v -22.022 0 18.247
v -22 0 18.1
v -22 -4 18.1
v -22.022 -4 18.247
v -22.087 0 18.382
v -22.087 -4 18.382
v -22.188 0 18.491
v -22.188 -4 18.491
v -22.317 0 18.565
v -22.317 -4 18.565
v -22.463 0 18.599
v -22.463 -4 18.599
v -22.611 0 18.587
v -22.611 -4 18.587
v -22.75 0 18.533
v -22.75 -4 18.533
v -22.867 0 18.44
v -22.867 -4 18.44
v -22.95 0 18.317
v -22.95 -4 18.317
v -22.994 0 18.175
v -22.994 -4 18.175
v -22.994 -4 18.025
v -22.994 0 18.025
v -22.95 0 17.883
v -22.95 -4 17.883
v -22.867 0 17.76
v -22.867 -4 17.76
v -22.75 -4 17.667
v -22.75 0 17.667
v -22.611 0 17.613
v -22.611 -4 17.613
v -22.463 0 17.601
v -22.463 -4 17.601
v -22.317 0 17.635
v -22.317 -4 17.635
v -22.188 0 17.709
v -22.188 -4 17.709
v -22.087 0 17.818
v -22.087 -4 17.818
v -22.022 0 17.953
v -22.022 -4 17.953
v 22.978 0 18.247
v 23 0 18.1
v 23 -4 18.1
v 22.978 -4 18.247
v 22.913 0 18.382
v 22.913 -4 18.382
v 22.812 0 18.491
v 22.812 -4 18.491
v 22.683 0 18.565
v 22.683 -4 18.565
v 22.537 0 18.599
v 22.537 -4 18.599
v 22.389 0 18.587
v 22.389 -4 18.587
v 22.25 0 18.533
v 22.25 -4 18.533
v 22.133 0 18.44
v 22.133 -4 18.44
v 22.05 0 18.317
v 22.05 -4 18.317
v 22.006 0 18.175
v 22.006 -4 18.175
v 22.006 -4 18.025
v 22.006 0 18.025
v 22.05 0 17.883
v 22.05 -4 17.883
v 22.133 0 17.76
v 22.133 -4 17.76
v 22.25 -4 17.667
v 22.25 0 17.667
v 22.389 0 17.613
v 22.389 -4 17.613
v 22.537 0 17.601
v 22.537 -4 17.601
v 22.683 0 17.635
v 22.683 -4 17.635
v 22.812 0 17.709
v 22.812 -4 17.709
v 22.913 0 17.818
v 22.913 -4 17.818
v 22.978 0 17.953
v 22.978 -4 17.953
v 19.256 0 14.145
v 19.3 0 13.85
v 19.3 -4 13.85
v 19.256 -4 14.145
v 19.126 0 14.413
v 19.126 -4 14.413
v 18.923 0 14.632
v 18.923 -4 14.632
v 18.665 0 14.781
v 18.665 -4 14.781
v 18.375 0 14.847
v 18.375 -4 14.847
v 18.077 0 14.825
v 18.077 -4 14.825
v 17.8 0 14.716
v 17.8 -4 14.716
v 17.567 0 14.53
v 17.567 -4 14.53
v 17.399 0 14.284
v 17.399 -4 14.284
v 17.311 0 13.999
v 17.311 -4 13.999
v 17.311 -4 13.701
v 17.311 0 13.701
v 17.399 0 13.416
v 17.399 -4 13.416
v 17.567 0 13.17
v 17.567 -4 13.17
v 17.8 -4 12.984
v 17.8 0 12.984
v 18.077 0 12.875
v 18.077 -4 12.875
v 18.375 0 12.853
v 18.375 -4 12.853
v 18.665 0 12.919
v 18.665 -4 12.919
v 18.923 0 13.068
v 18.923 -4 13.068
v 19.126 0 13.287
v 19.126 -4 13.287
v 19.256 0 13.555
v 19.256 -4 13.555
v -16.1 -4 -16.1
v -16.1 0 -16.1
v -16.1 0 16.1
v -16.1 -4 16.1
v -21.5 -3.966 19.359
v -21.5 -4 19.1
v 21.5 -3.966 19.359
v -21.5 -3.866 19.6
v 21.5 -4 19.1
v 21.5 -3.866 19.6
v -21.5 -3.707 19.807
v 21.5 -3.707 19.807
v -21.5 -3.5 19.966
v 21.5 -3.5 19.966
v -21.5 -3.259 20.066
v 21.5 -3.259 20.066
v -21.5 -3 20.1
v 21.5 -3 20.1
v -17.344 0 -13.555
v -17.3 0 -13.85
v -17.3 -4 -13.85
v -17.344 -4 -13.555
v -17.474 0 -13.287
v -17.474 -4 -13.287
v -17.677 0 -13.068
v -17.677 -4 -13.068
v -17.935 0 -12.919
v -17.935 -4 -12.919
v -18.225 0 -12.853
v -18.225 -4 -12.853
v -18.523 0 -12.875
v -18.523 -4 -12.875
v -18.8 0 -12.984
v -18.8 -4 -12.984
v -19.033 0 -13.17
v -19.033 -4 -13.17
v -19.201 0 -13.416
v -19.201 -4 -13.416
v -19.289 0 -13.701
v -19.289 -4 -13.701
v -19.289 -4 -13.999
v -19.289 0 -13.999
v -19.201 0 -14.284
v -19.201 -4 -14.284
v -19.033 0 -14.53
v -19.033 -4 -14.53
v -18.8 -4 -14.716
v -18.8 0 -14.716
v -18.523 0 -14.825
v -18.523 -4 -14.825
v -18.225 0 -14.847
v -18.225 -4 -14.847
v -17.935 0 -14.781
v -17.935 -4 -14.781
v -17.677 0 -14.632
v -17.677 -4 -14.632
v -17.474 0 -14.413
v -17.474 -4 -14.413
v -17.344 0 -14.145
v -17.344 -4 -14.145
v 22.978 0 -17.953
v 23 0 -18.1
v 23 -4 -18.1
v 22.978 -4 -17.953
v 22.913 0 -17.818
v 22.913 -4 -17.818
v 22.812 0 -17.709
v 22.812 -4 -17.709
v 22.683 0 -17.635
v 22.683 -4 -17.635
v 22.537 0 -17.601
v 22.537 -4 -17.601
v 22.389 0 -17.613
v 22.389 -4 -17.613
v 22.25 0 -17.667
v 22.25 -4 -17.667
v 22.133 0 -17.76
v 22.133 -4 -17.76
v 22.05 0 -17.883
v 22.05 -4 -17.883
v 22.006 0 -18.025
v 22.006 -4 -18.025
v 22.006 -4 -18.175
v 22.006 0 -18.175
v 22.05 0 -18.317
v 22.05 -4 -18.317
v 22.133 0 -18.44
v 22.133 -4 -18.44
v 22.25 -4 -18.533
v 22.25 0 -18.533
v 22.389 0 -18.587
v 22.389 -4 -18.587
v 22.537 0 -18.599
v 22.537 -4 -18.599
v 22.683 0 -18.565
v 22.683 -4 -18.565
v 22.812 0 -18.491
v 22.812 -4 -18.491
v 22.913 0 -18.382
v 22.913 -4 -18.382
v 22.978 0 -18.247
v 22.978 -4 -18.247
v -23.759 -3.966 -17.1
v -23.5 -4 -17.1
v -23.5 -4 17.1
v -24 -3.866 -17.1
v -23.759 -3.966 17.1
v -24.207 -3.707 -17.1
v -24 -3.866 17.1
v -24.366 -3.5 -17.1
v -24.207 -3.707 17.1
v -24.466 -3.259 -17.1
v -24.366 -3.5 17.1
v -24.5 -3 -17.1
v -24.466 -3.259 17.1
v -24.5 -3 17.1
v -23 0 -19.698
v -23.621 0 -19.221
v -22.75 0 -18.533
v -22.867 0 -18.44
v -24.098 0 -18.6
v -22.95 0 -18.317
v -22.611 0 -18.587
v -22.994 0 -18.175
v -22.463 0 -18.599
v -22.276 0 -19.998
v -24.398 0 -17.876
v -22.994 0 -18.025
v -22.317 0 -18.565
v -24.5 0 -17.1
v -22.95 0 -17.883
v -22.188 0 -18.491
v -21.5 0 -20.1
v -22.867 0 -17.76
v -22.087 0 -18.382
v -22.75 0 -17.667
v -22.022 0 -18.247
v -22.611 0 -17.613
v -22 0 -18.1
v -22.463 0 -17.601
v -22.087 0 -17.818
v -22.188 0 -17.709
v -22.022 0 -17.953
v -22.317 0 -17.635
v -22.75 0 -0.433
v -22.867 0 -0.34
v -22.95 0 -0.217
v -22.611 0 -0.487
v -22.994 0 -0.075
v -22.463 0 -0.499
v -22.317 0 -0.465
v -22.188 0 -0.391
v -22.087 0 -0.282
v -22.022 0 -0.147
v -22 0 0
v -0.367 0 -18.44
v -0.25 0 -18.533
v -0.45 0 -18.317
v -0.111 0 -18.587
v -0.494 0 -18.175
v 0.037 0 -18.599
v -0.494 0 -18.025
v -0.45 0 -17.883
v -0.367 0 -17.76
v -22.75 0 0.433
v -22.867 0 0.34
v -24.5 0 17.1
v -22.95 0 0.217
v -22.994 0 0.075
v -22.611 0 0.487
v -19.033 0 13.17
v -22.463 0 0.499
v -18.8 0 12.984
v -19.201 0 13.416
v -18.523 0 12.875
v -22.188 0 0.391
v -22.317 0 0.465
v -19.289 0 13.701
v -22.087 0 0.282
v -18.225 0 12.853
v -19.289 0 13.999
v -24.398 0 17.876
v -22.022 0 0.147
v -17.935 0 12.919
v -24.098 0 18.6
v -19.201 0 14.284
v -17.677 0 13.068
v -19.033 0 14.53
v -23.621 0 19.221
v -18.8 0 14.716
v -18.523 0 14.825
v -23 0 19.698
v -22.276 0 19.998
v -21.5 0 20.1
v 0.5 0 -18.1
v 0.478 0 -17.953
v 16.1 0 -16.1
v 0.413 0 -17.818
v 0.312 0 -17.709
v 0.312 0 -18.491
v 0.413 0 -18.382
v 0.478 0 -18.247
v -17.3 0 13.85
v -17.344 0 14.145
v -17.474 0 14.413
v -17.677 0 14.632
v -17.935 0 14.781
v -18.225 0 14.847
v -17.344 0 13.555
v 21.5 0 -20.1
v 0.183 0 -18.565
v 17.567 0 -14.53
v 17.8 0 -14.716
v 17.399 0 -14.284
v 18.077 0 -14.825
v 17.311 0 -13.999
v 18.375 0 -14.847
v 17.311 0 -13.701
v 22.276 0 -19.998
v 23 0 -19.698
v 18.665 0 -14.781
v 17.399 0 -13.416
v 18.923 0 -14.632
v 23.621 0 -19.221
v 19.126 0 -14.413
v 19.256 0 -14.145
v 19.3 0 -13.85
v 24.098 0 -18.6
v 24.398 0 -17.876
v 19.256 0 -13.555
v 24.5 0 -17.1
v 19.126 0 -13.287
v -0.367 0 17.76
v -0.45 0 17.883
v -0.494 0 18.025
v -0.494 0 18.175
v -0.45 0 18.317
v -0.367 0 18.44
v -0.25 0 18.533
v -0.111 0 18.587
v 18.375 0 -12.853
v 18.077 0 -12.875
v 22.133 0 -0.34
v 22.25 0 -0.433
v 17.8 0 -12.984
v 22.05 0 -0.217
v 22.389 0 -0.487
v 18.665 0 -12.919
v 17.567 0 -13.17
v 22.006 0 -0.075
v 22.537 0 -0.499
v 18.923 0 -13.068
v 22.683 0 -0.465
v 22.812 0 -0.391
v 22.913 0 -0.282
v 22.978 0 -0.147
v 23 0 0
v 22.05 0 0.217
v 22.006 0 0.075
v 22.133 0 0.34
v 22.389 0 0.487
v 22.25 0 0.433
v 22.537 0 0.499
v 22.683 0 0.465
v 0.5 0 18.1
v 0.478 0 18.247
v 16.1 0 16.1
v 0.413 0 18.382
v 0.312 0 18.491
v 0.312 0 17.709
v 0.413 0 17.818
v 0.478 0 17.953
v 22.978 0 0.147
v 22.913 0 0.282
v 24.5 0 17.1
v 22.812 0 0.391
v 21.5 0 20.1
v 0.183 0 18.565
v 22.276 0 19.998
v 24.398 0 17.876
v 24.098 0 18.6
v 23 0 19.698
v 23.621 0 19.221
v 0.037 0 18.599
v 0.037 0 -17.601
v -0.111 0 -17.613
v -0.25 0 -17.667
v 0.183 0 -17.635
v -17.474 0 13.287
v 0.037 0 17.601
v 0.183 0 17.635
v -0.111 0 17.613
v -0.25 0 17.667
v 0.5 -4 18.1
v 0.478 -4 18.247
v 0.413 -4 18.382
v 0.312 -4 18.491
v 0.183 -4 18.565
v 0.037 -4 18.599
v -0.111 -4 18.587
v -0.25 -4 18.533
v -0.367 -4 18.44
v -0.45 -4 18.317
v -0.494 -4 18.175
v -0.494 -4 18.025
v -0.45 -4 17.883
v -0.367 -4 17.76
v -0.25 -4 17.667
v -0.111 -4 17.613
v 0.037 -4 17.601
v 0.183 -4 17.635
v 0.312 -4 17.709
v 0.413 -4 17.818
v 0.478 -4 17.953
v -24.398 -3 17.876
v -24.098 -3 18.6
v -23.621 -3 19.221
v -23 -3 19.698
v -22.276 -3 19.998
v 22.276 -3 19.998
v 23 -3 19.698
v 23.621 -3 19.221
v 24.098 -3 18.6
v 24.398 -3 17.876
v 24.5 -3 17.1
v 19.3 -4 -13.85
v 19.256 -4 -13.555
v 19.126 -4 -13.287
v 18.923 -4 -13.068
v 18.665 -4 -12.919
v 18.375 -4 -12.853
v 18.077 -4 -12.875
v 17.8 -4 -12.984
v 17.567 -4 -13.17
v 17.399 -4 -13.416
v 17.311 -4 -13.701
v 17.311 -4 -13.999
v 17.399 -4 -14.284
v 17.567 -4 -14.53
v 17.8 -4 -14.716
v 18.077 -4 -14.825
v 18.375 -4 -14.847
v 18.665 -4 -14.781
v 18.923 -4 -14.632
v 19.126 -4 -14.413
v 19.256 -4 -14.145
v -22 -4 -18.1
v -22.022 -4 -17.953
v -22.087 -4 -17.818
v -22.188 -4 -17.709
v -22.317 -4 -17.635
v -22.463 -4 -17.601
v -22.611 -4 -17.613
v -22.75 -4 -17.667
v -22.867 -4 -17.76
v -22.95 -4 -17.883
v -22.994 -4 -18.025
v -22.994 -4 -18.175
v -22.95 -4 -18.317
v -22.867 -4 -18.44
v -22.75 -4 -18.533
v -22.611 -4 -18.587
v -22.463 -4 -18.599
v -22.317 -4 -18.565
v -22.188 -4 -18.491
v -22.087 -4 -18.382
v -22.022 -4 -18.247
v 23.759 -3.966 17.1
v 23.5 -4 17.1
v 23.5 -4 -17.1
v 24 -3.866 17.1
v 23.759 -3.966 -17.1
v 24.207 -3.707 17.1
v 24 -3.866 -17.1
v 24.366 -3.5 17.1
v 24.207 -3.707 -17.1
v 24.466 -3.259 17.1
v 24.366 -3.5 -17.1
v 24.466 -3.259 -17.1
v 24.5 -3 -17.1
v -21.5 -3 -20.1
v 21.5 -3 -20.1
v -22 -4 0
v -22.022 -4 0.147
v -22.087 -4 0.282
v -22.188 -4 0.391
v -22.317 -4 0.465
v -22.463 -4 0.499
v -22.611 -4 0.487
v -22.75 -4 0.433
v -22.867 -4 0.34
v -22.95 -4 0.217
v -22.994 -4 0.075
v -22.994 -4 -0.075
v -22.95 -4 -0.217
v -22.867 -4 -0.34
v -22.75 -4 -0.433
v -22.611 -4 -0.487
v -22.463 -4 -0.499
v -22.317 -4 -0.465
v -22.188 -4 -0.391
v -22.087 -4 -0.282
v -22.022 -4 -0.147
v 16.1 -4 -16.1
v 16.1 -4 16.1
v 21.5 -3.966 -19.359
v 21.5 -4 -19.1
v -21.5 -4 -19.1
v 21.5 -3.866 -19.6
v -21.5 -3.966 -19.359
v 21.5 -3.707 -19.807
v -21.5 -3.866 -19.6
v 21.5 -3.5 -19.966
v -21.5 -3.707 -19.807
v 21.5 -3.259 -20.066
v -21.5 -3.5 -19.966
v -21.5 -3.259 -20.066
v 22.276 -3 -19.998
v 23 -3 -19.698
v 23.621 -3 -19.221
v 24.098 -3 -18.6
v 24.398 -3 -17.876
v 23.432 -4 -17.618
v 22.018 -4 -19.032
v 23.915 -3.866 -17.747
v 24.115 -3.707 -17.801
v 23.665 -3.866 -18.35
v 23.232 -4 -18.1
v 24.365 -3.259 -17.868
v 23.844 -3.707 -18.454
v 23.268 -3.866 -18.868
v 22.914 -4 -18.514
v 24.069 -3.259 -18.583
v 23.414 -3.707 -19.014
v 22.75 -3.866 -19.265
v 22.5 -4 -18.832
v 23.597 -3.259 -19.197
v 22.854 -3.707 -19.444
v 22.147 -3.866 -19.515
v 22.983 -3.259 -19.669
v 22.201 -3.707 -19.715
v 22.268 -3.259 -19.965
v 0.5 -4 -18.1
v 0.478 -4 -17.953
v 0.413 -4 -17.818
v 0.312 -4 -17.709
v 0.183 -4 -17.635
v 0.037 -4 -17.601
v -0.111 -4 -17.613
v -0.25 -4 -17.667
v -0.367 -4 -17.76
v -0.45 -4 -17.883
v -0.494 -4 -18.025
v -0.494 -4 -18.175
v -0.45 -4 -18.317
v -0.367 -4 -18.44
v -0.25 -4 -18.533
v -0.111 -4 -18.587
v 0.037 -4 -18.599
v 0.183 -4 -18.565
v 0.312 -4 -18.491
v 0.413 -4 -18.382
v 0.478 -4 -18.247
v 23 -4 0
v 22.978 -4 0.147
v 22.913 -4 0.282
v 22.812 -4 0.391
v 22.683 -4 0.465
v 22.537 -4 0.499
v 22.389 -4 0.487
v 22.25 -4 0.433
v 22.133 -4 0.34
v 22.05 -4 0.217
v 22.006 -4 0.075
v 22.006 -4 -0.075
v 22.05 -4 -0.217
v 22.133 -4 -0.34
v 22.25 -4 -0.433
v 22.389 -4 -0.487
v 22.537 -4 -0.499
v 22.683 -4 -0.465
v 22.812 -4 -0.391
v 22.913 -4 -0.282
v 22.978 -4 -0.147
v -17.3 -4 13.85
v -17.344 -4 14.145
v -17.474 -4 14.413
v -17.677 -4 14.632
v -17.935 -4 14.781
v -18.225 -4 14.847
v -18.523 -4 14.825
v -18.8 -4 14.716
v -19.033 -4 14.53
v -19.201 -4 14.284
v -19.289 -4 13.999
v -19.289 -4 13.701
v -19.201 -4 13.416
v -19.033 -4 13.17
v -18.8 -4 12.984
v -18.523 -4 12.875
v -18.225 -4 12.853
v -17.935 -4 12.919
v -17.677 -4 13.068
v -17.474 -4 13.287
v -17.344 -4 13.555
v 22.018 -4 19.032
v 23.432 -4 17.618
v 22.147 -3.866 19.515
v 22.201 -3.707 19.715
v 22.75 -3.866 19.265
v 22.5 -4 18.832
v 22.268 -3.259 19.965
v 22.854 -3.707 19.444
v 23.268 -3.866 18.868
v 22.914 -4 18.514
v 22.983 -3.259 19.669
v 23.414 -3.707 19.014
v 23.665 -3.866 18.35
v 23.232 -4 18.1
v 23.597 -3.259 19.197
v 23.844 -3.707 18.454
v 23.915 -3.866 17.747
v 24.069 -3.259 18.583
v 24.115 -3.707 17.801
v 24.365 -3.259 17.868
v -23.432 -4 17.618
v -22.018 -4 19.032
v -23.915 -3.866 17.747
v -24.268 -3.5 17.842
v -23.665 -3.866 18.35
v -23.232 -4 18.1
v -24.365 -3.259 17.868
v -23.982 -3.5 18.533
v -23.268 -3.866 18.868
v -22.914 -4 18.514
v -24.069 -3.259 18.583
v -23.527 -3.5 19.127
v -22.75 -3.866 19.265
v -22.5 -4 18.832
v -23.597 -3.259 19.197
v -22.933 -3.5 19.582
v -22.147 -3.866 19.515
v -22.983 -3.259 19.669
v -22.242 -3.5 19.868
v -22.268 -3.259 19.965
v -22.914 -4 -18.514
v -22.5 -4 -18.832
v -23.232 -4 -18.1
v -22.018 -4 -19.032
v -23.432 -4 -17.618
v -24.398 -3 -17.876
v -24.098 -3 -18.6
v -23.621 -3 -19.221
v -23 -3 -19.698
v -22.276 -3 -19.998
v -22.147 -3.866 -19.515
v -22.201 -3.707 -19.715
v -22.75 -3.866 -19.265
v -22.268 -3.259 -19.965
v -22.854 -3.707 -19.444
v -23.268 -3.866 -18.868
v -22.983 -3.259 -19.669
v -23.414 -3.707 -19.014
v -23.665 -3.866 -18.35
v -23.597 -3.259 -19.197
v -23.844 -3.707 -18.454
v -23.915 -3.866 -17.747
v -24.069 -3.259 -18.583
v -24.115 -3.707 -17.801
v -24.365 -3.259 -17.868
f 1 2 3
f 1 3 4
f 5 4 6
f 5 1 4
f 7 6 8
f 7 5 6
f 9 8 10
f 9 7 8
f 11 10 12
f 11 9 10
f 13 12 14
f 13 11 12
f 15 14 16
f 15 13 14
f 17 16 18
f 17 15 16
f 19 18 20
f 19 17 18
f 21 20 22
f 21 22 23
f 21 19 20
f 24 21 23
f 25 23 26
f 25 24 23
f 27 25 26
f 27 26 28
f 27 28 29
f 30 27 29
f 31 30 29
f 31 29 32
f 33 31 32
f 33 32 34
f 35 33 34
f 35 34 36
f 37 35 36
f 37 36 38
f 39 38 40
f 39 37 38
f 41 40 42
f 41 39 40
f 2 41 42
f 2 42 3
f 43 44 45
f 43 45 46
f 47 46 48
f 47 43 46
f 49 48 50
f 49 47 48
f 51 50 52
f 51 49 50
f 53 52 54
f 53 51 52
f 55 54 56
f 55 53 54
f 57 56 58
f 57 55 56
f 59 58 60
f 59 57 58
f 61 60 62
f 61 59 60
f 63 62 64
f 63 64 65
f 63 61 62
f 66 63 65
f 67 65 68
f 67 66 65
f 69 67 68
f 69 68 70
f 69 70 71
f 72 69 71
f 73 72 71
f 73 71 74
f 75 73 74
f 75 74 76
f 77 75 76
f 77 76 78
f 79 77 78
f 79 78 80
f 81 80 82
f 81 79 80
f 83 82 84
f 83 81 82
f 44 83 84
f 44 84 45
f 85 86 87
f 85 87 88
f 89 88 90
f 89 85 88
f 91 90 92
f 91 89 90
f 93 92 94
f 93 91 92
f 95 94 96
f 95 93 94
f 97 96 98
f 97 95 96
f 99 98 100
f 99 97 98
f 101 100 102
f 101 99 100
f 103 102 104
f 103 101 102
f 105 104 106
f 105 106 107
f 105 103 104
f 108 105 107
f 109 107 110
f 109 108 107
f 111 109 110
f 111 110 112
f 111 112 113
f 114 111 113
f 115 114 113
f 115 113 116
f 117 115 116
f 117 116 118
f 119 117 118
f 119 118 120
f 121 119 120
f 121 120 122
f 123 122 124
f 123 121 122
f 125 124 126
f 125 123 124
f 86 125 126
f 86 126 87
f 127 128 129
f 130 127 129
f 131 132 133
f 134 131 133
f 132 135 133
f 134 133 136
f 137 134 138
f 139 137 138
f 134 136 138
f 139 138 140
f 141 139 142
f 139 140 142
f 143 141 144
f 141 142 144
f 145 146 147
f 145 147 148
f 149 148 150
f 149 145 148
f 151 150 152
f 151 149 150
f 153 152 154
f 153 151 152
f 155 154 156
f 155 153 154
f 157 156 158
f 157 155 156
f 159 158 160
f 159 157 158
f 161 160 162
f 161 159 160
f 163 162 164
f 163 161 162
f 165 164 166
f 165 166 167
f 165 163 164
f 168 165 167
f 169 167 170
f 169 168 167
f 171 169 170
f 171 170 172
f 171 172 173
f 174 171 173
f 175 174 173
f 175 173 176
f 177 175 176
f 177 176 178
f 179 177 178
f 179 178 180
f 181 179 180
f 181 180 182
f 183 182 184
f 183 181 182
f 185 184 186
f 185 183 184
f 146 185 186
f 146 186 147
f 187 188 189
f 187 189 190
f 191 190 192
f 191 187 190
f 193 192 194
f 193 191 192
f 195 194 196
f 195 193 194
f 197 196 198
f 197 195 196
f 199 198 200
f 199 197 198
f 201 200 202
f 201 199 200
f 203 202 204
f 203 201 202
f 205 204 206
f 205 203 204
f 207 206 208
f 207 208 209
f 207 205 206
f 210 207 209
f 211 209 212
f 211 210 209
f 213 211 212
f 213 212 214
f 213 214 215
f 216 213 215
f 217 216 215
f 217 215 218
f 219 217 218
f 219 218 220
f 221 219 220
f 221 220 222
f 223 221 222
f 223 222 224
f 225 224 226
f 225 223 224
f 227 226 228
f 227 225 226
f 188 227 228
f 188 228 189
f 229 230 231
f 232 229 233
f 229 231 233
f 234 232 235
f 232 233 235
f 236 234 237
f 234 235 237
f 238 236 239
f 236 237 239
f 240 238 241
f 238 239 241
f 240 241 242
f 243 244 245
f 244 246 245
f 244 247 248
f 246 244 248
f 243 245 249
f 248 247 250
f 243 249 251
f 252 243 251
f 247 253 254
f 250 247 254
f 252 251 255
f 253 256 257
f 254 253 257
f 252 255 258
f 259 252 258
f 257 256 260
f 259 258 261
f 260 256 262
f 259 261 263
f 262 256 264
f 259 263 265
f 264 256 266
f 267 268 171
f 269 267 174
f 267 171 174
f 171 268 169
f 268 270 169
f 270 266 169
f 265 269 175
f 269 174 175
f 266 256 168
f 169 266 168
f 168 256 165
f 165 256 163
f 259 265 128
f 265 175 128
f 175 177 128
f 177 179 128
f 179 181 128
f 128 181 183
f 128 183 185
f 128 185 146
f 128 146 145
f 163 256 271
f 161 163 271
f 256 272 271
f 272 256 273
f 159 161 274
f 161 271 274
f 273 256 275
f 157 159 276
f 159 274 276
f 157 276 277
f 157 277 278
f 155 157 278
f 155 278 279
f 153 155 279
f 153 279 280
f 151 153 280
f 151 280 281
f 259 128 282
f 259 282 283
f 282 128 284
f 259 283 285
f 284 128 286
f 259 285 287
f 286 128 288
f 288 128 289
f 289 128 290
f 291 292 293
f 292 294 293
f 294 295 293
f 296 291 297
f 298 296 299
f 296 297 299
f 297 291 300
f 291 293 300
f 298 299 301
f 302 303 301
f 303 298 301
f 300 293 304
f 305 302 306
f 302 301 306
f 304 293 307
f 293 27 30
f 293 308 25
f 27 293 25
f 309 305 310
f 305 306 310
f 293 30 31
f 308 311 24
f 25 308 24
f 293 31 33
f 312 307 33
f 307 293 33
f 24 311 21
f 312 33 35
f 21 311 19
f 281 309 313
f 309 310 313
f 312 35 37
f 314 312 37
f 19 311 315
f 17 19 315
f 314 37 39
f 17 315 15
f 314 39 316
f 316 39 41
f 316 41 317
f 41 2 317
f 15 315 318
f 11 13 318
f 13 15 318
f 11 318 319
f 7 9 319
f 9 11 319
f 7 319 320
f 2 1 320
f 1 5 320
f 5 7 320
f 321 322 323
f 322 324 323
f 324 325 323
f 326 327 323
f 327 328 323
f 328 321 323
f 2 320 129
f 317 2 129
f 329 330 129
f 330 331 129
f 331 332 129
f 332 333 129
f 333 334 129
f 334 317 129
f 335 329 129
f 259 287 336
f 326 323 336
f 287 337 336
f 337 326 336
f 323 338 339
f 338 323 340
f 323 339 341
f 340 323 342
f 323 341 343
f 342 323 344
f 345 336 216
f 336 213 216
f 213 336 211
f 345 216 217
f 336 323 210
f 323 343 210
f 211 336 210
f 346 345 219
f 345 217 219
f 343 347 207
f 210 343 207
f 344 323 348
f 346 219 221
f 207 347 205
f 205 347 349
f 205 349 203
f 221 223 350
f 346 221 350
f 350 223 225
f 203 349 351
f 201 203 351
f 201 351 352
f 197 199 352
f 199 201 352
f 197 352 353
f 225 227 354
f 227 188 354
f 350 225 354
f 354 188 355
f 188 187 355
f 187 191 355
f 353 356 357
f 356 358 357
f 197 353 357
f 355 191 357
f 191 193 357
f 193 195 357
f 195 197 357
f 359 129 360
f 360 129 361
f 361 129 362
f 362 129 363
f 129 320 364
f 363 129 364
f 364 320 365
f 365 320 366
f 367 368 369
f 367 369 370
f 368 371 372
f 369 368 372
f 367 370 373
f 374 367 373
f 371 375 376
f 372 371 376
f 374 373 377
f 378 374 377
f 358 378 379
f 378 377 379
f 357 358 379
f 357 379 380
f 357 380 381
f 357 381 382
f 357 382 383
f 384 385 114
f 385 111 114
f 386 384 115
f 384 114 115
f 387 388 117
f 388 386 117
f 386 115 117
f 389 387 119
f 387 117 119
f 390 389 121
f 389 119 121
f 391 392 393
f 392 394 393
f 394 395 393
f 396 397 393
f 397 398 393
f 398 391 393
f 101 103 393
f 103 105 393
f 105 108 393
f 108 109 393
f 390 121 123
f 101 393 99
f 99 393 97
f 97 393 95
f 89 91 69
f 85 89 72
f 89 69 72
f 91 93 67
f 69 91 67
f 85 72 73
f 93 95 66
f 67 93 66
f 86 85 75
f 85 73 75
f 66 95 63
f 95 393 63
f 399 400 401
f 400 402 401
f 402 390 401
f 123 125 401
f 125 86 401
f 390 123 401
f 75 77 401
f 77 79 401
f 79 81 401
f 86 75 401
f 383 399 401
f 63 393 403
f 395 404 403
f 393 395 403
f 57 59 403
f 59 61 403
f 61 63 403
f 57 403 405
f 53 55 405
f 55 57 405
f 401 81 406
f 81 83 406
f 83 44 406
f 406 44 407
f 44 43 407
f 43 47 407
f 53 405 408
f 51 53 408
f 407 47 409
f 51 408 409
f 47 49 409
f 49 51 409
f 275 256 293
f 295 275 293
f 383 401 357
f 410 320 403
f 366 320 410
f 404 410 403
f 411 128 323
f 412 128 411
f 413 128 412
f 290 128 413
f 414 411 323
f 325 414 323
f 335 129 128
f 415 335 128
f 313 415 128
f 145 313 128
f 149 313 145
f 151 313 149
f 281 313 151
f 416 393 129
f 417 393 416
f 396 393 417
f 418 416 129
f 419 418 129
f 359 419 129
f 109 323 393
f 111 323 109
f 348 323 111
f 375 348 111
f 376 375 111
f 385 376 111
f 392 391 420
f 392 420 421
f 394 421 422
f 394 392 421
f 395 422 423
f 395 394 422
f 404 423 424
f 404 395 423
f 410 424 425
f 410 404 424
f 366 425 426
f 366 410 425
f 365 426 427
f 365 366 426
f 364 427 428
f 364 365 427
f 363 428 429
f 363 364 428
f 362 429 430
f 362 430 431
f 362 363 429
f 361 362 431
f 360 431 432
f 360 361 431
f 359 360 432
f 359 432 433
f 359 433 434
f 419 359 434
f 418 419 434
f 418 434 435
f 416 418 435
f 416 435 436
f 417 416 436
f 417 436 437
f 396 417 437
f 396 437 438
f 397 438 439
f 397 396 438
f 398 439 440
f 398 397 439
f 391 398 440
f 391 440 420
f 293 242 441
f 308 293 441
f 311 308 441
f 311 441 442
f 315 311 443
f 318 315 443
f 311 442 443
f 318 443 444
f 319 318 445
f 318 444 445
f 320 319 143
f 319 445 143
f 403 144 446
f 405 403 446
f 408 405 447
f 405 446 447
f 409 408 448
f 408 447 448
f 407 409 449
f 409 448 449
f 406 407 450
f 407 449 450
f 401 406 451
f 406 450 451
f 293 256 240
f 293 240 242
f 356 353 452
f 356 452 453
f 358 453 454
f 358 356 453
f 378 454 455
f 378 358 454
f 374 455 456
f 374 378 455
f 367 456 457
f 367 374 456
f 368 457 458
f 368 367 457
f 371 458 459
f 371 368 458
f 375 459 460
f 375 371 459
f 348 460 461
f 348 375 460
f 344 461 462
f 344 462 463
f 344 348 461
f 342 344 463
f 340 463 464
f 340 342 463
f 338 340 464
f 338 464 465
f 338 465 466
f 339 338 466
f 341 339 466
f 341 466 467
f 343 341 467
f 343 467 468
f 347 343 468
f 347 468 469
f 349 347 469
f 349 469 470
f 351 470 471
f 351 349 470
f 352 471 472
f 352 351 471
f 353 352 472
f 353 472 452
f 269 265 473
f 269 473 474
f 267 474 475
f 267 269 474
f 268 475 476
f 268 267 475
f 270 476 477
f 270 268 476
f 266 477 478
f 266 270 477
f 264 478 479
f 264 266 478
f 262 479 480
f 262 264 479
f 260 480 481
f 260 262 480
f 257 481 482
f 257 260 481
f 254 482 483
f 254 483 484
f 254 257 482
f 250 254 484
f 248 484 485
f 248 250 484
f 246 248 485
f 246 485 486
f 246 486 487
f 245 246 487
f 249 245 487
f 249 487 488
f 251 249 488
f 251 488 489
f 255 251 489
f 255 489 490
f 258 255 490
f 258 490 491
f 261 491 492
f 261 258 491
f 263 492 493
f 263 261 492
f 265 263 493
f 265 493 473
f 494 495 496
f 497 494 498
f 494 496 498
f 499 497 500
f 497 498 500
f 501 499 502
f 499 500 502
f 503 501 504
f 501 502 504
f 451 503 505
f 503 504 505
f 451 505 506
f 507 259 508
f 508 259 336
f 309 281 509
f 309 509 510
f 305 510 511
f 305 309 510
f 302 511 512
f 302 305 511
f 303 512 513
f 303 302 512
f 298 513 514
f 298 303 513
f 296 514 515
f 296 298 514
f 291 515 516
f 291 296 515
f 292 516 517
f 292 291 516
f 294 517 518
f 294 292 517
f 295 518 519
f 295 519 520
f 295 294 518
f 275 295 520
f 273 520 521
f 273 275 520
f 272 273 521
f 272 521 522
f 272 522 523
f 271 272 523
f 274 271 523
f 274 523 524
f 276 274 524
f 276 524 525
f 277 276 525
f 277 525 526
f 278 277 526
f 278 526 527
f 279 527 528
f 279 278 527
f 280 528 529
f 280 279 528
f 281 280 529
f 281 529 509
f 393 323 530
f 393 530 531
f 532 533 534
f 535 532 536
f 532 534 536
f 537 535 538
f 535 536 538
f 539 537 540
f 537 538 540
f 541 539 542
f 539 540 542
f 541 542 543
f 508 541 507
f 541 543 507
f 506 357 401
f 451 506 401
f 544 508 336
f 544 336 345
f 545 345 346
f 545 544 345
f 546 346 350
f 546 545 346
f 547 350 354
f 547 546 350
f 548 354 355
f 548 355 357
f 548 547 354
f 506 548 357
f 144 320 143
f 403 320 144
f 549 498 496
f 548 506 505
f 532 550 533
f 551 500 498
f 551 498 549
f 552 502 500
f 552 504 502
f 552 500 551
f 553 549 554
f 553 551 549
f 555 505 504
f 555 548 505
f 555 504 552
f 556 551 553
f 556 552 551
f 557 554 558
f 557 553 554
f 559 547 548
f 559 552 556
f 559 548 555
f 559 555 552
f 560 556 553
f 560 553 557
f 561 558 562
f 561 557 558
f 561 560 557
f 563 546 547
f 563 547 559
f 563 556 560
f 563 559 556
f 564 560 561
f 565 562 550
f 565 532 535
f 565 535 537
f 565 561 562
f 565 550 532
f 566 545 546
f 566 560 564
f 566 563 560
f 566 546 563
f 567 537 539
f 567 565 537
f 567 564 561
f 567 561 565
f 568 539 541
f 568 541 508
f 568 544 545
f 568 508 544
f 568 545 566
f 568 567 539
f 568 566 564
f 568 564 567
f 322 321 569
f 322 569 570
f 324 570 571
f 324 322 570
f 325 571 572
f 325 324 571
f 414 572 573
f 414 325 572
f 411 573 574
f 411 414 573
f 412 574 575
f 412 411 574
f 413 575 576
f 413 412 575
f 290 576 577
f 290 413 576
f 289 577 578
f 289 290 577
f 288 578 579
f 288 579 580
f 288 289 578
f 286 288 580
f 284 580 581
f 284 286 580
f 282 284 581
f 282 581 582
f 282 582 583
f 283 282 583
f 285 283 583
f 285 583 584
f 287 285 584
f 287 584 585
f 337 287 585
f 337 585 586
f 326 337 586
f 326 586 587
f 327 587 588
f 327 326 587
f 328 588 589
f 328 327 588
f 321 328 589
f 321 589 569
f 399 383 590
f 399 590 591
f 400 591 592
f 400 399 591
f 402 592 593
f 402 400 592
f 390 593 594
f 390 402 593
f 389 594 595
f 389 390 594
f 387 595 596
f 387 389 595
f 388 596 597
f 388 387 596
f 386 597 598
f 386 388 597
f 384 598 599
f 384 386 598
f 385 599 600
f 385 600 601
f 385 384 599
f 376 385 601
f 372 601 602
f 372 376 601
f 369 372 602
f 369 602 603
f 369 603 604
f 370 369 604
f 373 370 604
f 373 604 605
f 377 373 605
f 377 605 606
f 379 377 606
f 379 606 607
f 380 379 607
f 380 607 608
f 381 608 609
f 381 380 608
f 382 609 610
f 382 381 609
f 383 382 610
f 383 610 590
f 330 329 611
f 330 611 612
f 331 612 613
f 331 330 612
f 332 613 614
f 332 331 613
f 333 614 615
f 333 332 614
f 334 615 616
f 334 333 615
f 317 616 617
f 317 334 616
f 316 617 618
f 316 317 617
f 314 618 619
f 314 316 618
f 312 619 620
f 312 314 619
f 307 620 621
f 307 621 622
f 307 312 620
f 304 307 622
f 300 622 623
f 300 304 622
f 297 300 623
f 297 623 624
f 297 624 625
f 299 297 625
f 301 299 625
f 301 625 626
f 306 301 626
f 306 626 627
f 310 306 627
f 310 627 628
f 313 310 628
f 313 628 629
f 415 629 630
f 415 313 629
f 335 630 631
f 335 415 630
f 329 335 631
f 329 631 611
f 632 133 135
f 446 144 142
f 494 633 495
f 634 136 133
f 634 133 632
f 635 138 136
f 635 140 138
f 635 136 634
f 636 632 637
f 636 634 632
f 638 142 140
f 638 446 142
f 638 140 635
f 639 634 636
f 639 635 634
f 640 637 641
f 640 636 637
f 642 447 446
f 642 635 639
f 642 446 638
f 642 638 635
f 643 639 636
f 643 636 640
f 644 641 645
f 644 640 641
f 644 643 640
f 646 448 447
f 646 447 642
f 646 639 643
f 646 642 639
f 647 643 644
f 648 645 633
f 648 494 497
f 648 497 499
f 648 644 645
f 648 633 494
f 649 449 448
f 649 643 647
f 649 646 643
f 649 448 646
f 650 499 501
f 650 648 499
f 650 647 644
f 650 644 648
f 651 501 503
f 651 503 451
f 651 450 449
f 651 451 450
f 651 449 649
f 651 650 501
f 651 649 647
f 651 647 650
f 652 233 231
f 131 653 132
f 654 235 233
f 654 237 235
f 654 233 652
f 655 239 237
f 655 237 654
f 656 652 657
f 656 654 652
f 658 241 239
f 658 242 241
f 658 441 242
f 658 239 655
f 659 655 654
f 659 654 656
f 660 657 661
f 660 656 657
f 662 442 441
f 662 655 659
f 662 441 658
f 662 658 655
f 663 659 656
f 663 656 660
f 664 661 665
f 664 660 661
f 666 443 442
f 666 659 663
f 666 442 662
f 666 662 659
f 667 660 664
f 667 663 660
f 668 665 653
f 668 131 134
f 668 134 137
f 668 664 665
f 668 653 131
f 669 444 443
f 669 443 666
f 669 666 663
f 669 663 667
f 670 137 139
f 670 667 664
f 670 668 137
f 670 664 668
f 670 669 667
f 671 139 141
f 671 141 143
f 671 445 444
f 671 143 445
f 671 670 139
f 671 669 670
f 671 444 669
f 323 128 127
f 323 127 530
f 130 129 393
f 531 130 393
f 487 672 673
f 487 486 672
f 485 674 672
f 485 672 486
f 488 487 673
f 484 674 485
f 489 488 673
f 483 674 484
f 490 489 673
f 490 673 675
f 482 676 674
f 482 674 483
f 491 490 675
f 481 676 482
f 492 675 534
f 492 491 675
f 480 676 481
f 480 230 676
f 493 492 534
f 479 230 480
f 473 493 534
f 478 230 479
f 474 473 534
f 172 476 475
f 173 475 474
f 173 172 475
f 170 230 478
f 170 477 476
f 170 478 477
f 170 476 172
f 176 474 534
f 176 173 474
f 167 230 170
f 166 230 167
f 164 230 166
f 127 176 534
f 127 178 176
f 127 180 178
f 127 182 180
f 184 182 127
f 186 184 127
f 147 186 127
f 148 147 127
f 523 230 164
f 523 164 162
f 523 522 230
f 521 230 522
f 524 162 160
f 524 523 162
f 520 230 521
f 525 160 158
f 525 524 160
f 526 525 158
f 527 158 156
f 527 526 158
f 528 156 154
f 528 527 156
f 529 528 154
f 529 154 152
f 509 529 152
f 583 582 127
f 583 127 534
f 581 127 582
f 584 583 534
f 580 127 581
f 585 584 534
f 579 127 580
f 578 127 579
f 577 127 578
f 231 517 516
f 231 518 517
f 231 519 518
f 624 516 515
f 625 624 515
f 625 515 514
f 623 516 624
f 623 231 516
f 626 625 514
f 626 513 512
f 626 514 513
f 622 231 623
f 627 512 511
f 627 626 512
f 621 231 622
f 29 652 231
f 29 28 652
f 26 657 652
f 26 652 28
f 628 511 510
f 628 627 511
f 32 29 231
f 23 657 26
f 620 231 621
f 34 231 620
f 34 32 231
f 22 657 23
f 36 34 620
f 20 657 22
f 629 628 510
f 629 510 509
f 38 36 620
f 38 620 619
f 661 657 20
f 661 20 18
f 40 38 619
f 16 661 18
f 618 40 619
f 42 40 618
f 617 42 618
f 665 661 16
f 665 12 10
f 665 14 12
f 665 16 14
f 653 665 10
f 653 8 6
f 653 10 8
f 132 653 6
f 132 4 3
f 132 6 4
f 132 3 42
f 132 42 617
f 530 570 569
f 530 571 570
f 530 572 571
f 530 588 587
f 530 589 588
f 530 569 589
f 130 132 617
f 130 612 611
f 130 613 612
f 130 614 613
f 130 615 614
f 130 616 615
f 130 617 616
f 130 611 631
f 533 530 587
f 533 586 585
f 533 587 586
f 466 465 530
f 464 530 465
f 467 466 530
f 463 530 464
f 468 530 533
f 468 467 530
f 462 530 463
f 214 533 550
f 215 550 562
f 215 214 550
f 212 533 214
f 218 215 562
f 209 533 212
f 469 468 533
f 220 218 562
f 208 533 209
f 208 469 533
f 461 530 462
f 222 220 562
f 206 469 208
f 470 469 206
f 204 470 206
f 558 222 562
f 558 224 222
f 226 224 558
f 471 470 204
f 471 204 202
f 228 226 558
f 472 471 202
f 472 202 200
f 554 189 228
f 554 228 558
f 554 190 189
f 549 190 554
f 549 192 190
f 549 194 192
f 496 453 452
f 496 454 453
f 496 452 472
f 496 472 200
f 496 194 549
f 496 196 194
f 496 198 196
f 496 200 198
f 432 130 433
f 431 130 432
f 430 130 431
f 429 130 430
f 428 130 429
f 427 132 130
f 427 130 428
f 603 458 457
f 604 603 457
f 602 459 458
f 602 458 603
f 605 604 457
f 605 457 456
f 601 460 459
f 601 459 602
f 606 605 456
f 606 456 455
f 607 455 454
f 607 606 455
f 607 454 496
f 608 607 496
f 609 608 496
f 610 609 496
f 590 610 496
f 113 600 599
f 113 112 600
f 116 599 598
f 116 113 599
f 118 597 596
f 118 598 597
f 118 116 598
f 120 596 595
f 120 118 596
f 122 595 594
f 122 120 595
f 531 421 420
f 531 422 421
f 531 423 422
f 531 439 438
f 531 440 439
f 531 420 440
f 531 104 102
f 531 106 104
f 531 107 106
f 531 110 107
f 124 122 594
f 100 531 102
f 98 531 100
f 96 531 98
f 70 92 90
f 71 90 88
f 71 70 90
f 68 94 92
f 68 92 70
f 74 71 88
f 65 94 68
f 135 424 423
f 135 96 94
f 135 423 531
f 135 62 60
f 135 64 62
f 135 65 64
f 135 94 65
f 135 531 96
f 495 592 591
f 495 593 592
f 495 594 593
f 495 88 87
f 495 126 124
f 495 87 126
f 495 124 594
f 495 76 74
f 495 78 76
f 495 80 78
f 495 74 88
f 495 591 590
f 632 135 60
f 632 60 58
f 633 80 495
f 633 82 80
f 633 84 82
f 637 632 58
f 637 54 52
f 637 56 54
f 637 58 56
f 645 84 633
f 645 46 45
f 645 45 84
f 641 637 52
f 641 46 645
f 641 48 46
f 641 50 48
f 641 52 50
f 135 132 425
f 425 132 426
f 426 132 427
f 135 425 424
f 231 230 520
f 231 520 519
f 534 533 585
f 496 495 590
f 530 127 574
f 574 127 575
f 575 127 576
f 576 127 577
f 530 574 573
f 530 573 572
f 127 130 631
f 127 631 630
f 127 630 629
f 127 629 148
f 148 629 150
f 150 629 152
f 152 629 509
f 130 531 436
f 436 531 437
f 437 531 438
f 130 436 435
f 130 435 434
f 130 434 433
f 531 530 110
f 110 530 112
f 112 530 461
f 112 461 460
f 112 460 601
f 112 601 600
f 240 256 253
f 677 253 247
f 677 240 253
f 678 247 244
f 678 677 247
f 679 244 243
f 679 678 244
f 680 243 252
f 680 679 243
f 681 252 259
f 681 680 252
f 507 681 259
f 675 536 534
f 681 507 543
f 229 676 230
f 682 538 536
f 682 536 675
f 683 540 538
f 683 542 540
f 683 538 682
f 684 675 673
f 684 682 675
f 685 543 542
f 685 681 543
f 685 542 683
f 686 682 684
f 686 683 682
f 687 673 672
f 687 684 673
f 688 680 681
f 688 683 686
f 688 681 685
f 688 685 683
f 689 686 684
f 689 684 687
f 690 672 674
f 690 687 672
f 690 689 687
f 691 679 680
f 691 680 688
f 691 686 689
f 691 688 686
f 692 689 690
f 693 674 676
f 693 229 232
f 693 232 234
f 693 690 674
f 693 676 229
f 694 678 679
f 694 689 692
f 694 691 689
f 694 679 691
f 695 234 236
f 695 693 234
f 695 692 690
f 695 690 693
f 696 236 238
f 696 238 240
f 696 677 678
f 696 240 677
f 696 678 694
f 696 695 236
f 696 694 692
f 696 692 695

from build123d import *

# Parameters (mm, degrees)
F0_W     = 49
F0_H     = 40.2
F0_R     = 0.5
F0_R_2   = 1
F0_W_2   = 32.2
F0_H_2   = 32.2
F1_DEPTH = 4
F2_R     = 3
F3_R     = 1


with BuildPart() as f1:
    # F0 (on Front) → F1 (new body)
    with BuildSketch(Plane.XZ):
        Rectangle(F0_W, F0_H)
        with Locations((-22.5, -18.1)):
            Circle(F0_R, mode=Mode.SUBTRACT)
        with Locations((-18.3, -13.85)):
            Circle(F0_R_2, mode=Mode.SUBTRACT)
        with Locations((0, -18.1)):
            Circle(F0_R, mode=Mode.SUBTRACT)
        with Locations((22.5, -18.1)):
            Circle(F0_R, mode=Mode.SUBTRACT)
        with Locations((18.3, -13.85)):
            Circle(F0_R_2, mode=Mode.SUBTRACT)
        with Locations((-22.5, 0)):
            Circle(F0_R, mode=Mode.SUBTRACT)
        Rectangle(F0_W_2, F0_H_2, mode=Mode.SUBTRACT)
        with Locations((-18.3, 13.85)):
            Circle(F0_R_2, mode=Mode.SUBTRACT)
        with Locations((-22.5, 18.1)):
            Circle(F0_R, mode=Mode.SUBTRACT)
        with Locations((0, 18.1)):
            Circle(F0_R, mode=Mode.SUBTRACT)
        with Locations((22.5, 0)):
            Circle(F0_R, mode=Mode.SUBTRACT)
        with Locations((18.3, 13.85)):
            Circle(F0_R_2, mode=Mode.SUBTRACT)
        with Locations((22.5, 18.1)):
            Circle(F0_R, mode=Mode.SUBTRACT)
    extrude(amount=F1_DEPTH)

    # F2
    f2_edges = [f1.edges().sort_by_distance(p)[0] for p in [
        (-24.5, -2, -20.1),
        (24.5, -2, -20.1),
        (24.5, -2, 20.1),
        (-24.5, -2, 20.1),
    ]]
    fillet(f2_edges, radius=F2_R)

    # F3
    f3_edges = [f1.edges().sort_by_distance(p)[0] for p in [
        (0, -4, 20.1),
    ]]
    fillet(f3_edges, radius=F3_R)


solid = f1.part
